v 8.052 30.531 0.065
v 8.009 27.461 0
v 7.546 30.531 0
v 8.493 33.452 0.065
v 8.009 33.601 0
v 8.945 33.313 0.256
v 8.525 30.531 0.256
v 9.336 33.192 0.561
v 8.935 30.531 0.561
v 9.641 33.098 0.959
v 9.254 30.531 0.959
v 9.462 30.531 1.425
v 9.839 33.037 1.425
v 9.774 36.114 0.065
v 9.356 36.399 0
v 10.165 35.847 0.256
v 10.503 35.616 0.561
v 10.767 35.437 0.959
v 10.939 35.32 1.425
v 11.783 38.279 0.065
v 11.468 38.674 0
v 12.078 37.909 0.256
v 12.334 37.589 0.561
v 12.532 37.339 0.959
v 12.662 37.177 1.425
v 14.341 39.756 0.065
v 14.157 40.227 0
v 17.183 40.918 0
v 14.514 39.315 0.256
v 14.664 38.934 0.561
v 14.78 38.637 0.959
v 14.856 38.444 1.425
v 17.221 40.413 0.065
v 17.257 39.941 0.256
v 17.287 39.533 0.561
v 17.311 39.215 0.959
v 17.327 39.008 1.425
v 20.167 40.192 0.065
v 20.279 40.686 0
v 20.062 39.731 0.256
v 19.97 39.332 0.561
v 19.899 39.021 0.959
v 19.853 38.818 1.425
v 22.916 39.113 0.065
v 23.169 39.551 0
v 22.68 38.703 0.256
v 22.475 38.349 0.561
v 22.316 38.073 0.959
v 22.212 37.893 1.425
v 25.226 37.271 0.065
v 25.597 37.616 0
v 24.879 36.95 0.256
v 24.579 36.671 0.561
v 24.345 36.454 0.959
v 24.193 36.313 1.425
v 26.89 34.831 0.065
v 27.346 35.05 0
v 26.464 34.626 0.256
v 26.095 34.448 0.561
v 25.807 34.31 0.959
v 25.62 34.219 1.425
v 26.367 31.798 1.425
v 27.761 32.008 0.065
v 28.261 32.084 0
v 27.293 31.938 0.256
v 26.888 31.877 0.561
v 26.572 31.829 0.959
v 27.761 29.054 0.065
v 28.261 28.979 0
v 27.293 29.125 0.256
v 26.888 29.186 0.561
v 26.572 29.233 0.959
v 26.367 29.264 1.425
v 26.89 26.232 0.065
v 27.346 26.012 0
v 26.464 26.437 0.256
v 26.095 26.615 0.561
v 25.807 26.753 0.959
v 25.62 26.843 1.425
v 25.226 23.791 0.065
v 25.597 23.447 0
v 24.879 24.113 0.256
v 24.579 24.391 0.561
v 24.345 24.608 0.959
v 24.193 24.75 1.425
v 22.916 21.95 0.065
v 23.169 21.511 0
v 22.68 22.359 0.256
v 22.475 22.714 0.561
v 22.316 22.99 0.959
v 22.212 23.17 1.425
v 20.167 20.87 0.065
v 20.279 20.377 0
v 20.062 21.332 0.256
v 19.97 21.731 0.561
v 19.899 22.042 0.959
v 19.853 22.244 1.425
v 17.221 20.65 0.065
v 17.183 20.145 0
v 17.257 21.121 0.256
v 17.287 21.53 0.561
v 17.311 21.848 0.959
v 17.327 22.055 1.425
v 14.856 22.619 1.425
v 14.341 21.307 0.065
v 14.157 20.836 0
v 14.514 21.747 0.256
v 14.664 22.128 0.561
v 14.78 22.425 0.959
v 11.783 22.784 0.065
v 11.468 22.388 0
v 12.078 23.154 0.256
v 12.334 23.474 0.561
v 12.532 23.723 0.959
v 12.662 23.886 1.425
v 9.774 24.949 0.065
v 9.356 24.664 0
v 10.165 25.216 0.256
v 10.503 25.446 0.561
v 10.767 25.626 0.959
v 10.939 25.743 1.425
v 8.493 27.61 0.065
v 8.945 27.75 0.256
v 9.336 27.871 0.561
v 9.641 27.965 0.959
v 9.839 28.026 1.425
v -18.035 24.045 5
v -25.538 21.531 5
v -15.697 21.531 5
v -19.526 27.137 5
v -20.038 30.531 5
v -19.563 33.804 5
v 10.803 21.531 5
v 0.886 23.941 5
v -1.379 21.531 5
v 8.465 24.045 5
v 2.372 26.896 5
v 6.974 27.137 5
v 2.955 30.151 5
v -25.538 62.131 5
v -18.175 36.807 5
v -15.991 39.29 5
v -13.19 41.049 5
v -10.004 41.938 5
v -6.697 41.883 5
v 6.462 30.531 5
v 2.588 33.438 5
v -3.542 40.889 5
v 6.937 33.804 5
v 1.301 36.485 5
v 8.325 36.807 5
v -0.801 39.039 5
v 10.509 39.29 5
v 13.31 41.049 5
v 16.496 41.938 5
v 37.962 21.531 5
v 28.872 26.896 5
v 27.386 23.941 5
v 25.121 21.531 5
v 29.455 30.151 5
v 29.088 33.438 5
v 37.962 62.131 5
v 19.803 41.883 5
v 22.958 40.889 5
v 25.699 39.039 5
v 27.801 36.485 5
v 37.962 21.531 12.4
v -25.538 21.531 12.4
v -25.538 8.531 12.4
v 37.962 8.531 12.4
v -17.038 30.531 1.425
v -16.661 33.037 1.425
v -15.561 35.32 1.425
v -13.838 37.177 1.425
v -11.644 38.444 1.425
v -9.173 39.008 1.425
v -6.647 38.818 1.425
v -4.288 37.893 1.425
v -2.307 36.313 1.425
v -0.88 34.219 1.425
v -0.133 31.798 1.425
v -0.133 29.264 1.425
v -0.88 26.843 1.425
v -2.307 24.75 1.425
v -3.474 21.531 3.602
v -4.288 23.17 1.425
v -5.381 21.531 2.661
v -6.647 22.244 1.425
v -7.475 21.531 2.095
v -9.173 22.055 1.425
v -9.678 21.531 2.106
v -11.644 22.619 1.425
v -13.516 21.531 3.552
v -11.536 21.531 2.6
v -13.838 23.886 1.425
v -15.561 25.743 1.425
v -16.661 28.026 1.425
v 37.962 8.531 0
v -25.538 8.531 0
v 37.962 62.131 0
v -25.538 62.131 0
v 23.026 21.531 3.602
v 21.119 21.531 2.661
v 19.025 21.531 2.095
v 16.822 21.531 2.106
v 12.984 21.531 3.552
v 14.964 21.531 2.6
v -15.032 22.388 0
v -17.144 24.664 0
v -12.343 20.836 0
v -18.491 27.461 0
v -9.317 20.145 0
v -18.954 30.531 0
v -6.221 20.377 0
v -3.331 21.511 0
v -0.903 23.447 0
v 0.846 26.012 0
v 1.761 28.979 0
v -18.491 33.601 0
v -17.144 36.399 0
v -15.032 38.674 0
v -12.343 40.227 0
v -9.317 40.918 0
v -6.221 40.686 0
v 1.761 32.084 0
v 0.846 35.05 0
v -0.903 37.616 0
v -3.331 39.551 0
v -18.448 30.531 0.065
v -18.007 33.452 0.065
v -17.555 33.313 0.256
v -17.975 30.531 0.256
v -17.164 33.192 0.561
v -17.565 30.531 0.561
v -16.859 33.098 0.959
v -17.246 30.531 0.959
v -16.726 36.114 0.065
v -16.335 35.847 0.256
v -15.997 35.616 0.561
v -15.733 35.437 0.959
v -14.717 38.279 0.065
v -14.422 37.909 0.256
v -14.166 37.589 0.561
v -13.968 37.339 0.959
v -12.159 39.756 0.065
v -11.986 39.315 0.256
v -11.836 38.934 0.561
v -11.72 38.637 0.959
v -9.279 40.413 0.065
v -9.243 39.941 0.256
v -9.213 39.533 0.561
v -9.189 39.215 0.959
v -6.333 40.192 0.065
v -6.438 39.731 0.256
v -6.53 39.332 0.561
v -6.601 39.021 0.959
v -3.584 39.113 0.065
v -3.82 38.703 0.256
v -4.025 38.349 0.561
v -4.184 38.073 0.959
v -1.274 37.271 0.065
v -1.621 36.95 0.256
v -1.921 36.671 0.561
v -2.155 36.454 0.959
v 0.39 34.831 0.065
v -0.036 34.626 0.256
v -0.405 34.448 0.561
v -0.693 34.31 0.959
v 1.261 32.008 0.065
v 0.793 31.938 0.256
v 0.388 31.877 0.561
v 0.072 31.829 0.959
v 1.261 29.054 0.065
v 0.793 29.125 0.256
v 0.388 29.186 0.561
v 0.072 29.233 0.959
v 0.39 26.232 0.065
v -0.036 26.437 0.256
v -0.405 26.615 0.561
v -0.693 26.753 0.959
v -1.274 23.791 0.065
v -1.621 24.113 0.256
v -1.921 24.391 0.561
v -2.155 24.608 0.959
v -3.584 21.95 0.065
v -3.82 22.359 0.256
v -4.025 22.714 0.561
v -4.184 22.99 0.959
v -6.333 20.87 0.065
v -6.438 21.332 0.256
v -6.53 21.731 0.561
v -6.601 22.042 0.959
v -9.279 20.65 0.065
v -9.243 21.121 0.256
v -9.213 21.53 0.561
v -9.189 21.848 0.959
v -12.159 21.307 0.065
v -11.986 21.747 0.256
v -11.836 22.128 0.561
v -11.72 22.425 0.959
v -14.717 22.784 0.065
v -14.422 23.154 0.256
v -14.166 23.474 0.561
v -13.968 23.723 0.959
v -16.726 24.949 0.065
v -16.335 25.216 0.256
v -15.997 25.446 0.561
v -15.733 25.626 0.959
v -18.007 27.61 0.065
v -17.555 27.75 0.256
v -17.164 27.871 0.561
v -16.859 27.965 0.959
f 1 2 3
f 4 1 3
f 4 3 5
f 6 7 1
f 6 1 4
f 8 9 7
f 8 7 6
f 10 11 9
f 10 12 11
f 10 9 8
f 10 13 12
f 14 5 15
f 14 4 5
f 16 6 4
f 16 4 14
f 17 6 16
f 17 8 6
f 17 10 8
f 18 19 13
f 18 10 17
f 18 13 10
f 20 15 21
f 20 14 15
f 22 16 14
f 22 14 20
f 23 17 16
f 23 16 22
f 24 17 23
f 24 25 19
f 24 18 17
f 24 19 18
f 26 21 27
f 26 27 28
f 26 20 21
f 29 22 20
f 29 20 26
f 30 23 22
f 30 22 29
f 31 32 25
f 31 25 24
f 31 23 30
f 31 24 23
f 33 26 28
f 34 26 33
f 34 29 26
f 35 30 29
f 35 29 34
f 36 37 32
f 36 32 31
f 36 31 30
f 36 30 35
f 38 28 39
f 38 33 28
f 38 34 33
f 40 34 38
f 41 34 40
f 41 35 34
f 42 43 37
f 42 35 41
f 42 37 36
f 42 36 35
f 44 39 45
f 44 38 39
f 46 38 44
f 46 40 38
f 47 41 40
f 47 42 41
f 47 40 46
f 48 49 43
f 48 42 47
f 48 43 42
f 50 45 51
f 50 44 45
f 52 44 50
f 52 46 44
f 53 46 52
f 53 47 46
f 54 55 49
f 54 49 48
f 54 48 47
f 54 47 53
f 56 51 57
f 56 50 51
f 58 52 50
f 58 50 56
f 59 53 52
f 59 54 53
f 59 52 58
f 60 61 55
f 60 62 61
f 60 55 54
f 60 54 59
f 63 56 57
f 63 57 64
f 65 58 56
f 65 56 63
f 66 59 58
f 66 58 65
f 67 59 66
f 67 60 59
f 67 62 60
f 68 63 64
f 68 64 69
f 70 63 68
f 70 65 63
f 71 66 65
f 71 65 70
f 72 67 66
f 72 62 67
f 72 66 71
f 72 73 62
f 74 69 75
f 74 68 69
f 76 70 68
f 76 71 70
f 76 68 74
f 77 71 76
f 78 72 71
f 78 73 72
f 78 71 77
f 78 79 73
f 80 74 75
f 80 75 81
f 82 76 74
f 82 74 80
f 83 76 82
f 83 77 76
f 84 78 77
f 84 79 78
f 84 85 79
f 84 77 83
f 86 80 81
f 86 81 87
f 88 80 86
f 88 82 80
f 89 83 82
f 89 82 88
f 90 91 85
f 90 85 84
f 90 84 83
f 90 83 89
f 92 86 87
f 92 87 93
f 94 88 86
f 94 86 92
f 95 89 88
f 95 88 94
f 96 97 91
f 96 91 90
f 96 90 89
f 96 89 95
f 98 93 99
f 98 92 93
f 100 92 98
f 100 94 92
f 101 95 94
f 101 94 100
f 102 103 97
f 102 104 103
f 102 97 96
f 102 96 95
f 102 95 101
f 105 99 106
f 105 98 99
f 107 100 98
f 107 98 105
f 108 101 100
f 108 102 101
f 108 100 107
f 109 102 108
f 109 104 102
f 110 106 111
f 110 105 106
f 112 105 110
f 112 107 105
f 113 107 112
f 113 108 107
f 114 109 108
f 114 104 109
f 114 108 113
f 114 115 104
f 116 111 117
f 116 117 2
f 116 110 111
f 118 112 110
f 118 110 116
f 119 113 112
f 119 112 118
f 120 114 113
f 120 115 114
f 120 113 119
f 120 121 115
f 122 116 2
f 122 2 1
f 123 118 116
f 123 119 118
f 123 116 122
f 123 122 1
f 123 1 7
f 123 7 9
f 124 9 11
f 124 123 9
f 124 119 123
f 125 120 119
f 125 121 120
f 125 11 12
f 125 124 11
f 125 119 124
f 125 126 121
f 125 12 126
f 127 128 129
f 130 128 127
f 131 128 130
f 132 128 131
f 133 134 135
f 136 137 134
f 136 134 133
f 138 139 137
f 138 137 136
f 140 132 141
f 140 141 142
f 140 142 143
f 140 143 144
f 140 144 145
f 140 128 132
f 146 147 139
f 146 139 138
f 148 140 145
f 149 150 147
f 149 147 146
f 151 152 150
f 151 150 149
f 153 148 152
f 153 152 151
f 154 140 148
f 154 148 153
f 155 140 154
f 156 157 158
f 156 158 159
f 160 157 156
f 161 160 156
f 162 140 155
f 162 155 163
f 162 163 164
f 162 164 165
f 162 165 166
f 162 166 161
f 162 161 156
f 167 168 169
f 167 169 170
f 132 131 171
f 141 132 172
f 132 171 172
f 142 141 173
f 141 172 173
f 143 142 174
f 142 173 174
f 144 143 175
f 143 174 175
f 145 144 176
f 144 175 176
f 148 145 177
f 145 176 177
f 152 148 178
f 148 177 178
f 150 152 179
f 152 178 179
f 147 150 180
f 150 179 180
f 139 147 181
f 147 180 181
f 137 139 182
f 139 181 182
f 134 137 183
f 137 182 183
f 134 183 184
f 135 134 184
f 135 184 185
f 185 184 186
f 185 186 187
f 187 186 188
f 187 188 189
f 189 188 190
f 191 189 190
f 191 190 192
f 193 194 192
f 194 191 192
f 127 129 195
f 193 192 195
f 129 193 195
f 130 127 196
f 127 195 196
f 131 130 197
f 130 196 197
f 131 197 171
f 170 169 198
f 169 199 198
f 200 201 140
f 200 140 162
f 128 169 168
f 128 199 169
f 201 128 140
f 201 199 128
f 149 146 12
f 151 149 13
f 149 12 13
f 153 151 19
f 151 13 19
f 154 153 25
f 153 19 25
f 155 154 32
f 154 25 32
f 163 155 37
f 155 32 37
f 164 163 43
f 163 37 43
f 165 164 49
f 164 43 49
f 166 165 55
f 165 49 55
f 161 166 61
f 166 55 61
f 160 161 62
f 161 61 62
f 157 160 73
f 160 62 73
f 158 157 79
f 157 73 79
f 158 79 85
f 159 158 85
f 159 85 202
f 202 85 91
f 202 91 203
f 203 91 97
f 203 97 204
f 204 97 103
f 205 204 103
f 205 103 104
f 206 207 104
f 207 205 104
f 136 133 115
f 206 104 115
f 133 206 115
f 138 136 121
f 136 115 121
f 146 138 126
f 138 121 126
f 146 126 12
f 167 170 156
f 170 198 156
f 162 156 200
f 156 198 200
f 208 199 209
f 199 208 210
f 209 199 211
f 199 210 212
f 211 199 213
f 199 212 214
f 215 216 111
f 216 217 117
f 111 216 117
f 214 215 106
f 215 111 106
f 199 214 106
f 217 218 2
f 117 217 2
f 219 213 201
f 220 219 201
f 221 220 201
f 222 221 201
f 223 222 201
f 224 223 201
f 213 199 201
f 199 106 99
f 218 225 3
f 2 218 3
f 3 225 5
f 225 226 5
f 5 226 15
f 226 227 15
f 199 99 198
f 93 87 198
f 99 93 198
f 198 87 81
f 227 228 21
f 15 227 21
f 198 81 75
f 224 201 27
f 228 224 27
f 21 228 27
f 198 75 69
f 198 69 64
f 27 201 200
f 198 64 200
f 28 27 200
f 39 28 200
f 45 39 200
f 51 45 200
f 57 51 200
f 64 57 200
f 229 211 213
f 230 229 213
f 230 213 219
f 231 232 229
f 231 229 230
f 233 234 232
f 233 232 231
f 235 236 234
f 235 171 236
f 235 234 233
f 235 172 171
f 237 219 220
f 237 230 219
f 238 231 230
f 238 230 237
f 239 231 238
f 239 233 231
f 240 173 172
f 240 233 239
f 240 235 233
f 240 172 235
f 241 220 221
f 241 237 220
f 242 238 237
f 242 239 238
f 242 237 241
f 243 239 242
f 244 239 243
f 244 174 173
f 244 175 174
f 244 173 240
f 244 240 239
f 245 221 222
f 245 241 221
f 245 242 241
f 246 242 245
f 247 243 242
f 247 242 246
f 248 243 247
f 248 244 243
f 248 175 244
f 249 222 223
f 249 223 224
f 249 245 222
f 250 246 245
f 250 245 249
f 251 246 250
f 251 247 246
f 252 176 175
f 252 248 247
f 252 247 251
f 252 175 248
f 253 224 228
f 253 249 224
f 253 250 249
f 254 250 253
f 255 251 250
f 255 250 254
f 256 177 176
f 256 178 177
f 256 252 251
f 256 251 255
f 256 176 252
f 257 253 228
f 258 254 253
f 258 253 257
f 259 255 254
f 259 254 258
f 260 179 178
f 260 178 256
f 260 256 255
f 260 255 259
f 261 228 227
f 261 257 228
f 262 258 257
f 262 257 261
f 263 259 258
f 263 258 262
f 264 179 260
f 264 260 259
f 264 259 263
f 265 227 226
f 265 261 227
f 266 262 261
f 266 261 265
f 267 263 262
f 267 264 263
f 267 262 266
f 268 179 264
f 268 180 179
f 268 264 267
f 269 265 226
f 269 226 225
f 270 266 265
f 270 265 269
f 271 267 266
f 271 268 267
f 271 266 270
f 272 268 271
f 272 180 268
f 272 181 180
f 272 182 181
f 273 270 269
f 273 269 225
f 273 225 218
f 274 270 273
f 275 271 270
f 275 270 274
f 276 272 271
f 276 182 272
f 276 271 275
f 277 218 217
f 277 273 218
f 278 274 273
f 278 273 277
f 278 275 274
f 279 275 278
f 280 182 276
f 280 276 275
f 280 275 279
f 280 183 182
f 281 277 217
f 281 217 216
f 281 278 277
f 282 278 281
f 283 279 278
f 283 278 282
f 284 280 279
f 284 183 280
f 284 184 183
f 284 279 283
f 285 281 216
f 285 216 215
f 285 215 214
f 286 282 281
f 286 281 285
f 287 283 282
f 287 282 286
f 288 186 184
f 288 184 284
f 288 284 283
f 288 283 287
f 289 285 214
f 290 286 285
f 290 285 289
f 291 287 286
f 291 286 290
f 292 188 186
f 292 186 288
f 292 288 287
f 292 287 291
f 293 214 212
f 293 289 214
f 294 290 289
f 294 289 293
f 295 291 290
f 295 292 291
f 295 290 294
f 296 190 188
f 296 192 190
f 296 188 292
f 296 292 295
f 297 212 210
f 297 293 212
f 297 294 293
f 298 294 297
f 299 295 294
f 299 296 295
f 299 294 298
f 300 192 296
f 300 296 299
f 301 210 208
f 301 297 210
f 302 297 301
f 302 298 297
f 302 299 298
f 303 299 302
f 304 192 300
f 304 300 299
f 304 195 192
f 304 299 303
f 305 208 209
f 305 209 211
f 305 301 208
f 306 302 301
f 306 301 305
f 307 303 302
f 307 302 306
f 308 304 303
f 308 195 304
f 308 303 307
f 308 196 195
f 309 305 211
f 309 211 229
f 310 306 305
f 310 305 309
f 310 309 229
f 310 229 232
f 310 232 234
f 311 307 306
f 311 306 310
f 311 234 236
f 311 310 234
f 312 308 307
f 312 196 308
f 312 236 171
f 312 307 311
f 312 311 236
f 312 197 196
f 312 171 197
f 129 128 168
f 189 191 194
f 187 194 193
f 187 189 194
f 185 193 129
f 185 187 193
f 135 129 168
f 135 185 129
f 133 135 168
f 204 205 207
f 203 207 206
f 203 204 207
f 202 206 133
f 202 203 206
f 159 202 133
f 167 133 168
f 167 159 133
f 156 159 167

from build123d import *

# Parameters (mm, degrees)
SKICA2_W                 = 63.5
SKICA2_H                 = 53.6
P_IDAT_VYSUNUT_M1_DEPTH  = 5
SKICA3_W                 = 63.5
SKICA3_H                 = 13
P_IDAT_VYSUNUT_M2_DEPTH  = 7.4
SKICA5_R                 = 8.5
ODEBRAT_VYSUNUT_M1_DEPTH = 74
ZKOSEN_1_SIZE            = 3
ZKOSEN_1_SIZE_2          = 3.575260778
ZAOBLIT1_R               = 2


with BuildPart() as part:
    # Skica2 → Přidat vysunutím1 (new body)
    with BuildSketch(Plane.XY):
        with Locations((6.211756064, 35.331333862)):
            Rectangle(SKICA2_W, SKICA2_H)
    extrude(amount=P_IDAT_VYSUNUT_M1_DEPTH)

    # Skica3 → Přidat vysunutím2 (add)
    with BuildSketch(Plane.XY.offset(5)):
        with Locations((6.211756064, 15.031333862)):
            Rectangle(SKICA3_W, SKICA3_H)
    extrude(amount=P_IDAT_VYSUNUT_M2_DEPTH)

    # Skica5 → Odebrat vysunutím1 (cut)
    with BuildSketch(Plane(origin=(0, 0, 0), x_dir=(-1, 0, 0), z_dir=(0, 0, -1))):
        with Locations((-17.961756064, 30.531333862)):
            Circle(SKICA5_R)
        with Locations((8.538243936, 30.531333862)):
            Circle(SKICA5_R)
    extrude(amount=-ODEBRAT_VYSUNUT_M1_DEPTH, mode=Mode.SUBTRACT)

    # Zkosení1
    # the kernel refuses this chamfer: 3.575260778, 3 mm, written as the material it takes off along each edge
    with BuildSketch(Plane(origin=(17.961756064, 30.531333862, 5), x_dir=(-1, 0, 0), z_dir=(0, -1, 0))) as zkosen_1_piece_1_section:
        Polygon((8.5 + ZKOSEN_1_SIZE, 0), (8.5, ZKOSEN_1_SIZE_2), (8.5, 0), align=None)
    zkosen_1_piece_1 = revolve(axis=Axis((17.961756064, 30.531333862, 5), (0, 0, -1)), mode=Mode.PRIVATE)
    zkosen_1_piece_1 = split(zkosen_1_piece_1, bisect_by=Plane(origin=(27.909166998, 21.531333862, 3.256497077), z_dir=(0, 1, 0)), keep=Keep.TOP, mode=Mode.PRIVATE)
    add(zkosen_1_piece_1, mode=Mode.SUBTRACT)
    with BuildSketch(Plane(origin=(-8.538243936, 30.531333862, 5), x_dir=(-1, 0, 0), z_dir=(0, -1, 0))) as zkosen_1_piece_2_section:
        Polygon((8.5 + ZKOSEN_1_SIZE, 0), (8.5, ZKOSEN_1_SIZE_2), (8.5, 0), align=None)
    zkosen_1_piece_2 = revolve(axis=Axis((-8.538243936, 30.531333862, 5), (0, 0, -1)), mode=Mode.PRIVATE)
    zkosen_1_piece_2 = split(zkosen_1_piece_2, bisect_by=Plane(origin=(1.409166998, 21.531333862, 3.256497077), z_dir=(0, 1, 0)), keep=Keep.TOP, mode=Mode.PRIVATE)
    add(zkosen_1_piece_2, mode=Mode.SUBTRACT)

    # Zaoblit1
    # the kernel refuses this fillet: 2 mm, written as the material it takes off along each edge
    with BuildSketch(Plane(origin=(17.961756064, 30.531333862, 0), x_dir=(-1, 0, 0), z_dir=(0, -1, 0))) as zaoblit1_piece_1:
        with BuildLine():
            CenterArc((10.415482978, -2), ZAOBLIT1_R, 90, 73.283856072)
            Line((8.5, -1.424739222), (8.46169034, -1.413234006))
            ThreePointArc((8.46169034, -1.413234006), (8.46, -0.712369611), (8.46, 0))
            Line((8.46, 0), (8.5, 0.04))
            Line((8.5, 0.04), (10.415482978, 0.04))
            Line((10.415482978, 0.04), (10.415482978, 0))
        make_face()
    revolve(axis=Axis((17.961756064, 30.531333862, 0), (0, 0, -1)), mode=Mode.SUBTRACT)
    with BuildSketch(Plane(origin=(-8.538243936, 30.531333862, 0), x_dir=(-1, 0, 0), z_dir=(0, -1, 0))) as zaoblit1_piece_2:
        with BuildLine():
            CenterArc((10.415482978, -2), ZAOBLIT1_R, 90, 73.283856072)
            Line((8.5, -1.424739222), (8.46169034, -1.413234006))
            ThreePointArc((8.46169034, -1.413234006), (8.46, -0.712369611), (8.46, 0))
            Line((8.46, 0), (8.5, 0.04))
            Line((8.5, 0.04), (10.415482978, 0.04))
            Line((10.415482978, 0.04), (10.415482978, 0))
        make_face()
    revolve(axis=Axis((-8.538243936, 30.531333862, 0), (0, 0, -1)), mode=Mode.SUBTRACT)


solid = part.part
